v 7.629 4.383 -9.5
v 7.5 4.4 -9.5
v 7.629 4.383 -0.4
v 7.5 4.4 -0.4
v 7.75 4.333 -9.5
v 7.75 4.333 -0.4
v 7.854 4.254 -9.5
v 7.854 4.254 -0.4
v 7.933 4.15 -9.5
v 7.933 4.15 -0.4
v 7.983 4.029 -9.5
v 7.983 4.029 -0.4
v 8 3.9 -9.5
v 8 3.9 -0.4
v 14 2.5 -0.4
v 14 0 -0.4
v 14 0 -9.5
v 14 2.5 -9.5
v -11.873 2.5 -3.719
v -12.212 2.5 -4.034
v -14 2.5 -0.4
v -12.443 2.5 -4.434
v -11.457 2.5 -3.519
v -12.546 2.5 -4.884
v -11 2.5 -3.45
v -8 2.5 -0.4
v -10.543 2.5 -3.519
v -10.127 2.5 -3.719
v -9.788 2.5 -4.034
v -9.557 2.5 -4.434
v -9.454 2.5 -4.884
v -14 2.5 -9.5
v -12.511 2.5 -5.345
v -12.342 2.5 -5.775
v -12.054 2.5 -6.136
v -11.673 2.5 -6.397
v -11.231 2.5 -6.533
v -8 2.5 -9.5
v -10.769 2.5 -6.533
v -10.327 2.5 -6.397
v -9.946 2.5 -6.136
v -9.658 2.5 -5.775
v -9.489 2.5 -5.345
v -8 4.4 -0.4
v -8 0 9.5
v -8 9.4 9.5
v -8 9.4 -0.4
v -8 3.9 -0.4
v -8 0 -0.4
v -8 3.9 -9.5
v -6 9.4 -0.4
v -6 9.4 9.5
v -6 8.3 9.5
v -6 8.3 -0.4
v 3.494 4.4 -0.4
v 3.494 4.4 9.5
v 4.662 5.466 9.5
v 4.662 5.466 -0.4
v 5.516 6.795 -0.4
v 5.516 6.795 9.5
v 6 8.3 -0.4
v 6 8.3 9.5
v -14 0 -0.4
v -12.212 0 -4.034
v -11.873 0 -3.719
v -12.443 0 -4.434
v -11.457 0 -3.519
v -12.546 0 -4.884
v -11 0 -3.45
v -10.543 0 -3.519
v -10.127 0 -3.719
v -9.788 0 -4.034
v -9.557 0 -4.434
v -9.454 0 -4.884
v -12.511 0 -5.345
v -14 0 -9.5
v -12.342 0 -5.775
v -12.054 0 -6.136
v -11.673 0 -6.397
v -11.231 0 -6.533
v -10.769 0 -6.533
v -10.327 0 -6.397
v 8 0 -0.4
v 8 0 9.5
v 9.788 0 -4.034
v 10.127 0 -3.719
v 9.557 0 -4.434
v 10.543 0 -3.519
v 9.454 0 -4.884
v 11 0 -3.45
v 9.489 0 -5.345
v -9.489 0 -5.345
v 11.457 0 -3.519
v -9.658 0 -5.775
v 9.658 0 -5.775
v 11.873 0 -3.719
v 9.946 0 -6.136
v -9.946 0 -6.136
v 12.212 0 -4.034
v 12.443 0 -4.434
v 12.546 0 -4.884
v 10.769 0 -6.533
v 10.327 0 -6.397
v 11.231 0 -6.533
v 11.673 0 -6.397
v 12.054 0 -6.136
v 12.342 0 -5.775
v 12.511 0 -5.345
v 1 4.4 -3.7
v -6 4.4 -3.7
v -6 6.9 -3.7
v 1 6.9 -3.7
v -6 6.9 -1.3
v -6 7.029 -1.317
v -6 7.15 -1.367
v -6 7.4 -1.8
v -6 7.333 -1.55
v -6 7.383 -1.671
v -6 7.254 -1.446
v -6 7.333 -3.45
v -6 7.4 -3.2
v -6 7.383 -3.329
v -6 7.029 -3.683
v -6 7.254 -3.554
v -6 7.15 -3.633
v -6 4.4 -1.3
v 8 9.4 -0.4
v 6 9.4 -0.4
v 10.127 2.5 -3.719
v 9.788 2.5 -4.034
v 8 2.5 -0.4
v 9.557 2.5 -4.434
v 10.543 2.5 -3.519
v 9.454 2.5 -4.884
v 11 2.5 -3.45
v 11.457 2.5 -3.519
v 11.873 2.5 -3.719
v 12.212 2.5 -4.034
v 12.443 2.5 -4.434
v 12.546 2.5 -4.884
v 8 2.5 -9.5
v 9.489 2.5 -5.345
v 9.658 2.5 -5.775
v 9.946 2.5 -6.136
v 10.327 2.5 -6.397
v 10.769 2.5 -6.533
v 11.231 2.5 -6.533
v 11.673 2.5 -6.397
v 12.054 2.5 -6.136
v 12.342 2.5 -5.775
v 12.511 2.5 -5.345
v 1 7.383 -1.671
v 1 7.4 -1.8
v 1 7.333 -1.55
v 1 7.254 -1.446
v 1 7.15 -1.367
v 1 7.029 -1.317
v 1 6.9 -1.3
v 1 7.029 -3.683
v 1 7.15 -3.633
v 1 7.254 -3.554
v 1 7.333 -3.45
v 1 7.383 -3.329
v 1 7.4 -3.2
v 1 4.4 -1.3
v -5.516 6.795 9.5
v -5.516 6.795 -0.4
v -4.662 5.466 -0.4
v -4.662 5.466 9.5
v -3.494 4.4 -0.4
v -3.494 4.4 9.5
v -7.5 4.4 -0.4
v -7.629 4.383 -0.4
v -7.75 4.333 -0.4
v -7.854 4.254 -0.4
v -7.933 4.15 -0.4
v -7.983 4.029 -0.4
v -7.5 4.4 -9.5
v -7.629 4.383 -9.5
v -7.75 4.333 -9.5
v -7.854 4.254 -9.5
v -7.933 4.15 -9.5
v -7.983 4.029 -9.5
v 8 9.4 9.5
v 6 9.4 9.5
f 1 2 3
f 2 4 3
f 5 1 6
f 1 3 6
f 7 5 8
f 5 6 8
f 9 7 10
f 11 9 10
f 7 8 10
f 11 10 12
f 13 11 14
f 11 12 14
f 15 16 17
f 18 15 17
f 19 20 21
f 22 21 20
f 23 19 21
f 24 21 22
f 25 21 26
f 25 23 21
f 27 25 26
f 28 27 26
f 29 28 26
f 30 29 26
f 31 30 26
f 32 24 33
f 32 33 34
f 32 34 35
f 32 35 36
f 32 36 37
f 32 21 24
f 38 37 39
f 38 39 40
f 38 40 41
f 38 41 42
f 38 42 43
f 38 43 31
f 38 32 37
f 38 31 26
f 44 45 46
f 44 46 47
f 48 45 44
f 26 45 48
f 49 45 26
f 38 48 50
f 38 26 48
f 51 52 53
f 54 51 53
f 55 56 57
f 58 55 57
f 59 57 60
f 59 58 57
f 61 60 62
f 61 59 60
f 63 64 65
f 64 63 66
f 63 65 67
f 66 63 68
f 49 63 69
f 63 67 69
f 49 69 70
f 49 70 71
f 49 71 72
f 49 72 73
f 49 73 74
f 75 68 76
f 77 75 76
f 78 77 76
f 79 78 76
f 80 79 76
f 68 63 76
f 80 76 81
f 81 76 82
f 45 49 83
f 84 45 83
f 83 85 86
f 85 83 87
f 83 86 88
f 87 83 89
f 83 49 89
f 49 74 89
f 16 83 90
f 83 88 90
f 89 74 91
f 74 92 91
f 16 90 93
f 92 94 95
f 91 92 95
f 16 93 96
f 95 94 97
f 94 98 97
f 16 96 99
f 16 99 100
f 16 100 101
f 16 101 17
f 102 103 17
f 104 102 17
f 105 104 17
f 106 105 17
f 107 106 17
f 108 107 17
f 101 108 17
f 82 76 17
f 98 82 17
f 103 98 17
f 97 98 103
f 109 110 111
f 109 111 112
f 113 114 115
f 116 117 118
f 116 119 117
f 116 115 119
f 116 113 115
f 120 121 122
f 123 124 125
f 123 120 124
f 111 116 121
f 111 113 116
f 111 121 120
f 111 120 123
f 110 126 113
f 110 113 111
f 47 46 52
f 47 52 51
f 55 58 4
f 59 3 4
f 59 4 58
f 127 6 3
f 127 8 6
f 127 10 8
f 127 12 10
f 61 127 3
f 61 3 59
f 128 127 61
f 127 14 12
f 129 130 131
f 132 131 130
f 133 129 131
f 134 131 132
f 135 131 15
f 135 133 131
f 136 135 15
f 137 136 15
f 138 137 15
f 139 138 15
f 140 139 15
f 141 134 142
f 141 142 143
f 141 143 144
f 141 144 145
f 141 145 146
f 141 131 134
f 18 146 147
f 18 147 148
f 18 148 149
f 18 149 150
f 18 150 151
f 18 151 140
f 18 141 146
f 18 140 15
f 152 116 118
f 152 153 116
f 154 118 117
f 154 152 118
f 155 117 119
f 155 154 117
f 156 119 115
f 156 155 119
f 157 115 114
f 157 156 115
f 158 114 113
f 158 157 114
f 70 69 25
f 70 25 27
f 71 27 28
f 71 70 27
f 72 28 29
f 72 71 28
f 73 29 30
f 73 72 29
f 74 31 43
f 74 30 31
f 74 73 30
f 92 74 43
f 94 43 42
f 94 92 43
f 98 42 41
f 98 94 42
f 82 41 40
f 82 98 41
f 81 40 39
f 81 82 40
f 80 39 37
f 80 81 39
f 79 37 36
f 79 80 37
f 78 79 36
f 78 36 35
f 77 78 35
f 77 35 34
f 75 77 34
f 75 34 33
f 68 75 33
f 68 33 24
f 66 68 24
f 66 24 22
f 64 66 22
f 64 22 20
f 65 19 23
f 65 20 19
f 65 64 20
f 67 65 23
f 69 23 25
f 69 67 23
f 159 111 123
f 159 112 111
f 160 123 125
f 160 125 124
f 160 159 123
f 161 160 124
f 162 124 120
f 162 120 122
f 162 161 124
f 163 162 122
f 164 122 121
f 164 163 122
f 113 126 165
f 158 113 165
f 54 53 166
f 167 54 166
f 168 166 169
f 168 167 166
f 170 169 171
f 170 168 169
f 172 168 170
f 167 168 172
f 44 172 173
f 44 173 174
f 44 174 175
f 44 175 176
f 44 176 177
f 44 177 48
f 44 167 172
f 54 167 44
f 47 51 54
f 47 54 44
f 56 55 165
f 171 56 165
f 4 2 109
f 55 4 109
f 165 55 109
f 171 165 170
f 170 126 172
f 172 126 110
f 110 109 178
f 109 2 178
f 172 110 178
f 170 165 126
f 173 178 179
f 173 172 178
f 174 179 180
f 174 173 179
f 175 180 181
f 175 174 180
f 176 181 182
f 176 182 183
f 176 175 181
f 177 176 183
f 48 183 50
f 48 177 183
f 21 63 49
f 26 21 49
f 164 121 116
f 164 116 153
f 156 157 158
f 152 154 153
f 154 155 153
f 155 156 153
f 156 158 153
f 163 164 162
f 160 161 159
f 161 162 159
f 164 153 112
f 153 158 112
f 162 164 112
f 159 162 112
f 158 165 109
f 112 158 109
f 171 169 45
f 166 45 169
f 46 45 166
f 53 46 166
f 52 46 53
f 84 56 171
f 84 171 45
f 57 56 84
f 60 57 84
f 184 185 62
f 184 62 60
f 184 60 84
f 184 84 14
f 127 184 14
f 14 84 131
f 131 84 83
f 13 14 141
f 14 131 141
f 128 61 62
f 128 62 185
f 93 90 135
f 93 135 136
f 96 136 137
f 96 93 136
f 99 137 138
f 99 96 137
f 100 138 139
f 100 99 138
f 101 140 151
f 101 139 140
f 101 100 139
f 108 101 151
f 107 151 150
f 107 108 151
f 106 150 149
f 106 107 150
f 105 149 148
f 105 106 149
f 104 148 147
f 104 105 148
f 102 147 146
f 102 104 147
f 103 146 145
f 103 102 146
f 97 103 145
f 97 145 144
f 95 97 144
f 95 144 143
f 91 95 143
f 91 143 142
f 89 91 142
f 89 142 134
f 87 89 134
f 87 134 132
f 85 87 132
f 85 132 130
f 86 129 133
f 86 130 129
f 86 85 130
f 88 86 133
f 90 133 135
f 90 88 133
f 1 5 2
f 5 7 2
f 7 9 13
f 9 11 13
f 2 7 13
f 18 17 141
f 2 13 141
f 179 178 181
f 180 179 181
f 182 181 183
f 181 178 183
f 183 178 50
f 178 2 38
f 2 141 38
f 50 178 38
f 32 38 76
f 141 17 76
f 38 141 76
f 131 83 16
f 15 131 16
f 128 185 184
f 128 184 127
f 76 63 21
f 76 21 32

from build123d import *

# Parameters (mm, degrees)
SKETCH2_W                = 16
SKETCH2_H                = 19
BOSS_EXTRUDE1_DEPTH      = 13.3
SKETCH3_W                = 12
SKETCH3_H                = 19
CUT_EXTRUDE1_DEPTH       = 8.9
CUT_EXTRUDE2_DEPTH       = 19.19725254
CUT_EXTRUDE2_DEPTH_BACK  = 19.19725254
SKETCH4_W                = 9.9
SKETCH4_H                = 3.9
SKETCH6_W                = 14
SKETCH6_H                = 9.1
BOSS_EXTRUDE2_DEPTH      = 2.5
CUT_EXTRUDE4_DEPTH       = 21.072119968
CUT_EXTRUDE4_DEPTH_BACK  = 21.072119968
SKETCH7_R                = 1.55
BOSS_EXTRUDE3_DEPTH      = 9.5
BOSS_EXTRUDE3_DEPTH_BACK = 9.1
SKETCH14_W               = 12
SKETCH14_H               = 8.9
CUT_EXTRUDE9_DEPTH       = 22.520687721
CUT_EXTRUDE9_DEPTH_BACK  = 22.520687721
FILLET4_R                = 0.9
SKETCH16_W               = 16.145602647
SKETCH16_H               = 8.9
CUT_EXTRUDE10_DEPTH      = 9.1
SKETCH17_W               = 7
SKETCH17_H               = 2.4
BOSS_EXTRUDE4_DEPTH      = 3
FILLET6_R                = 0.5
FILLET7_R                = 0.5
FILLET8_R                = 0.5


with BuildPart() as part:
    # Sketch2 → Boss-Extrude1 (new body)
    with BuildSketch(Plane(origin=(0, 0, 0), x_dir=(1, 0, 0), z_dir=(0, 1, 0))):
        Rectangle(SKETCH2_W, SKETCH2_H)
    extrude(amount=BOSS_EXTRUDE1_DEPTH)

    # Sketch3 → Cut-Extrude1 (cut)
    with BuildSketch(Plane(origin=(0, 13.3, 0), x_dir=(1, 0, 0), z_dir=(0, 1, 0))):
        Rectangle(SKETCH3_W, SKETCH3_H)
    extrude(amount=-CUT_EXTRUDE1_DEPTH, mode=Mode.SUBTRACT)

    # Sketch4 → Cut-Extrude2 (cut, two sides: drawn at the far end of the back side and taken through both)
    with BuildSketch(Plane(origin=(0, 0, 0), x_dir=(0, 0, -1), z_dir=(1, 0, 0)).offset(-CUT_EXTRUDE2_DEPTH_BACK)):
        with Locations((-4.55, 11.35)):
            Rectangle(SKETCH4_W, SKETCH4_H)
    extrude(amount=CUT_EXTRUDE2_DEPTH + CUT_EXTRUDE2_DEPTH_BACK, mode=Mode.SUBTRACT)

    # Sketch6 → Boss-Extrude2 (add)
    with BuildSketch(Plane(origin=(0, 0, 0), x_dir=(1, 0, 0), z_dir=(0, 1, 0))):
        with Locations((7, 4.95)):
            Rectangle(SKETCH6_W, SKETCH6_H)
        with Locations((-7, 4.95)):
            Rectangle(SKETCH6_W, SKETCH6_H)
    extrude(amount=BOSS_EXTRUDE2_DEPTH)

    # Sketch7 → Cut-Extrude4 (cut, two sides: drawn at the far end of the back side and taken through both)
    with BuildSketch(Plane(origin=(0, 2.5, 0), x_dir=(1, 0, 0), z_dir=(0, 1, 0)).offset(-CUT_EXTRUDE4_DEPTH_BACK)):
        with Locations(Location((-11, 5, 0), (0, 0, 270))):
            Circle(SKETCH7_R)
        with Locations(Location((11, 5, 0), (0, 0, 270))):
            Circle(SKETCH7_R)
    extrude(amount=CUT_EXTRUDE4_DEPTH + CUT_EXTRUDE4_DEPTH_BACK, mode=Mode.SUBTRACT)

    # Sketch14 → Boss-Extrude3 (add, two sides: drawn at the far end of the back side and taken through both)
    with BuildSketch(Plane.XY.offset(-BOSS_EXTRUDE3_DEPTH_BACK)):
        with Locations((0, 8.85)):
            Rectangle(SKETCH14_W, SKETCH14_H)
    extrude(amount=BOSS_EXTRUDE3_DEPTH + BOSS_EXTRUDE3_DEPTH_BACK)

    # Sketch15 → Cut-Extrude9 (cut, two sides: drawn at the far end of the back side and taken through both)
    with BuildSketch(Plane.XY.offset(-CUT_EXTRUDE9_DEPTH_BACK)):
        with BuildLine():
            ThreePointArc((-6, 8.3), (-5.132040834, 6.102704612), (-3.494281042, 4.4))
            Line((-3.494281042, 4.4), (3.494281042, 4.4))
            ThreePointArc((3.494281042, 4.4), (5.132040834, 6.102704612), (6, 8.3))
            Line((6, 8.3), (6, 13.3))
            Line((6, 13.3), (-6, 13.3))
            Line((-6, 13.3), (-6, 8.3))
        make_face()
    extrude(amount=CUT_EXTRUDE9_DEPTH + CUT_EXTRUDE9_DEPTH_BACK, mode=Mode.SUBTRACT)

    # Fillet4
    fillet4_edges = [part.edges().sort_by_distance(p)[0] for p in [
        (-6, 4.4, -9.3),
        (6, 4.4, -9.3),
    ]]
    fillet(fillet4_edges, radius=FILLET4_R)

    # Sketch16 → Cut-Extrude10 (cut)
    with BuildSketch(Plane(origin=(0, 0, -9.5), x_dir=(-1, 0, 0), z_dir=(0, 0, -1))):
        with Locations((-0.072801324, 8.85)):
            Rectangle(SKETCH16_W, SKETCH16_H)
    extrude(amount=-CUT_EXTRUDE10_DEPTH, mode=Mode.SUBTRACT)

    # Sketch17 → Boss-Extrude4 (add)
    with BuildSketch(Plane(origin=(0, 4.4, 0), x_dir=(1, 0, 0), z_dir=(0, 1, 0))):
        with Locations((-2.5, 2.5)):
            Rectangle(SKETCH17_W, SKETCH17_H)
    extrude(amount=BOSS_EXTRUDE4_DEPTH)

    # Fillet6
    fillet6_edges = [part.edges().sort_by_distance(p)[0] for p in [
        (-2.5, 7.4, -3.7),
    ]]
    fillet(fillet6_edges, radius=FILLET6_R)

    # Fillet7
    fillet7_edges = [part.edges().sort_by_distance(p)[0] for p in [
        (-2.5, 7.4, -1.3),
    ]]
    fillet(fillet7_edges, radius=FILLET7_R)

    # Fillet8
    fillet8_edges = [part.edges().sort_by_distance(p)[0] for p in [
        (8, 4.4, -4.95),
        (-8, 4.4, -4.95),
    ]]
    fillet(fillet8_edges, radius=FILLET8_R)


solid = part.part
